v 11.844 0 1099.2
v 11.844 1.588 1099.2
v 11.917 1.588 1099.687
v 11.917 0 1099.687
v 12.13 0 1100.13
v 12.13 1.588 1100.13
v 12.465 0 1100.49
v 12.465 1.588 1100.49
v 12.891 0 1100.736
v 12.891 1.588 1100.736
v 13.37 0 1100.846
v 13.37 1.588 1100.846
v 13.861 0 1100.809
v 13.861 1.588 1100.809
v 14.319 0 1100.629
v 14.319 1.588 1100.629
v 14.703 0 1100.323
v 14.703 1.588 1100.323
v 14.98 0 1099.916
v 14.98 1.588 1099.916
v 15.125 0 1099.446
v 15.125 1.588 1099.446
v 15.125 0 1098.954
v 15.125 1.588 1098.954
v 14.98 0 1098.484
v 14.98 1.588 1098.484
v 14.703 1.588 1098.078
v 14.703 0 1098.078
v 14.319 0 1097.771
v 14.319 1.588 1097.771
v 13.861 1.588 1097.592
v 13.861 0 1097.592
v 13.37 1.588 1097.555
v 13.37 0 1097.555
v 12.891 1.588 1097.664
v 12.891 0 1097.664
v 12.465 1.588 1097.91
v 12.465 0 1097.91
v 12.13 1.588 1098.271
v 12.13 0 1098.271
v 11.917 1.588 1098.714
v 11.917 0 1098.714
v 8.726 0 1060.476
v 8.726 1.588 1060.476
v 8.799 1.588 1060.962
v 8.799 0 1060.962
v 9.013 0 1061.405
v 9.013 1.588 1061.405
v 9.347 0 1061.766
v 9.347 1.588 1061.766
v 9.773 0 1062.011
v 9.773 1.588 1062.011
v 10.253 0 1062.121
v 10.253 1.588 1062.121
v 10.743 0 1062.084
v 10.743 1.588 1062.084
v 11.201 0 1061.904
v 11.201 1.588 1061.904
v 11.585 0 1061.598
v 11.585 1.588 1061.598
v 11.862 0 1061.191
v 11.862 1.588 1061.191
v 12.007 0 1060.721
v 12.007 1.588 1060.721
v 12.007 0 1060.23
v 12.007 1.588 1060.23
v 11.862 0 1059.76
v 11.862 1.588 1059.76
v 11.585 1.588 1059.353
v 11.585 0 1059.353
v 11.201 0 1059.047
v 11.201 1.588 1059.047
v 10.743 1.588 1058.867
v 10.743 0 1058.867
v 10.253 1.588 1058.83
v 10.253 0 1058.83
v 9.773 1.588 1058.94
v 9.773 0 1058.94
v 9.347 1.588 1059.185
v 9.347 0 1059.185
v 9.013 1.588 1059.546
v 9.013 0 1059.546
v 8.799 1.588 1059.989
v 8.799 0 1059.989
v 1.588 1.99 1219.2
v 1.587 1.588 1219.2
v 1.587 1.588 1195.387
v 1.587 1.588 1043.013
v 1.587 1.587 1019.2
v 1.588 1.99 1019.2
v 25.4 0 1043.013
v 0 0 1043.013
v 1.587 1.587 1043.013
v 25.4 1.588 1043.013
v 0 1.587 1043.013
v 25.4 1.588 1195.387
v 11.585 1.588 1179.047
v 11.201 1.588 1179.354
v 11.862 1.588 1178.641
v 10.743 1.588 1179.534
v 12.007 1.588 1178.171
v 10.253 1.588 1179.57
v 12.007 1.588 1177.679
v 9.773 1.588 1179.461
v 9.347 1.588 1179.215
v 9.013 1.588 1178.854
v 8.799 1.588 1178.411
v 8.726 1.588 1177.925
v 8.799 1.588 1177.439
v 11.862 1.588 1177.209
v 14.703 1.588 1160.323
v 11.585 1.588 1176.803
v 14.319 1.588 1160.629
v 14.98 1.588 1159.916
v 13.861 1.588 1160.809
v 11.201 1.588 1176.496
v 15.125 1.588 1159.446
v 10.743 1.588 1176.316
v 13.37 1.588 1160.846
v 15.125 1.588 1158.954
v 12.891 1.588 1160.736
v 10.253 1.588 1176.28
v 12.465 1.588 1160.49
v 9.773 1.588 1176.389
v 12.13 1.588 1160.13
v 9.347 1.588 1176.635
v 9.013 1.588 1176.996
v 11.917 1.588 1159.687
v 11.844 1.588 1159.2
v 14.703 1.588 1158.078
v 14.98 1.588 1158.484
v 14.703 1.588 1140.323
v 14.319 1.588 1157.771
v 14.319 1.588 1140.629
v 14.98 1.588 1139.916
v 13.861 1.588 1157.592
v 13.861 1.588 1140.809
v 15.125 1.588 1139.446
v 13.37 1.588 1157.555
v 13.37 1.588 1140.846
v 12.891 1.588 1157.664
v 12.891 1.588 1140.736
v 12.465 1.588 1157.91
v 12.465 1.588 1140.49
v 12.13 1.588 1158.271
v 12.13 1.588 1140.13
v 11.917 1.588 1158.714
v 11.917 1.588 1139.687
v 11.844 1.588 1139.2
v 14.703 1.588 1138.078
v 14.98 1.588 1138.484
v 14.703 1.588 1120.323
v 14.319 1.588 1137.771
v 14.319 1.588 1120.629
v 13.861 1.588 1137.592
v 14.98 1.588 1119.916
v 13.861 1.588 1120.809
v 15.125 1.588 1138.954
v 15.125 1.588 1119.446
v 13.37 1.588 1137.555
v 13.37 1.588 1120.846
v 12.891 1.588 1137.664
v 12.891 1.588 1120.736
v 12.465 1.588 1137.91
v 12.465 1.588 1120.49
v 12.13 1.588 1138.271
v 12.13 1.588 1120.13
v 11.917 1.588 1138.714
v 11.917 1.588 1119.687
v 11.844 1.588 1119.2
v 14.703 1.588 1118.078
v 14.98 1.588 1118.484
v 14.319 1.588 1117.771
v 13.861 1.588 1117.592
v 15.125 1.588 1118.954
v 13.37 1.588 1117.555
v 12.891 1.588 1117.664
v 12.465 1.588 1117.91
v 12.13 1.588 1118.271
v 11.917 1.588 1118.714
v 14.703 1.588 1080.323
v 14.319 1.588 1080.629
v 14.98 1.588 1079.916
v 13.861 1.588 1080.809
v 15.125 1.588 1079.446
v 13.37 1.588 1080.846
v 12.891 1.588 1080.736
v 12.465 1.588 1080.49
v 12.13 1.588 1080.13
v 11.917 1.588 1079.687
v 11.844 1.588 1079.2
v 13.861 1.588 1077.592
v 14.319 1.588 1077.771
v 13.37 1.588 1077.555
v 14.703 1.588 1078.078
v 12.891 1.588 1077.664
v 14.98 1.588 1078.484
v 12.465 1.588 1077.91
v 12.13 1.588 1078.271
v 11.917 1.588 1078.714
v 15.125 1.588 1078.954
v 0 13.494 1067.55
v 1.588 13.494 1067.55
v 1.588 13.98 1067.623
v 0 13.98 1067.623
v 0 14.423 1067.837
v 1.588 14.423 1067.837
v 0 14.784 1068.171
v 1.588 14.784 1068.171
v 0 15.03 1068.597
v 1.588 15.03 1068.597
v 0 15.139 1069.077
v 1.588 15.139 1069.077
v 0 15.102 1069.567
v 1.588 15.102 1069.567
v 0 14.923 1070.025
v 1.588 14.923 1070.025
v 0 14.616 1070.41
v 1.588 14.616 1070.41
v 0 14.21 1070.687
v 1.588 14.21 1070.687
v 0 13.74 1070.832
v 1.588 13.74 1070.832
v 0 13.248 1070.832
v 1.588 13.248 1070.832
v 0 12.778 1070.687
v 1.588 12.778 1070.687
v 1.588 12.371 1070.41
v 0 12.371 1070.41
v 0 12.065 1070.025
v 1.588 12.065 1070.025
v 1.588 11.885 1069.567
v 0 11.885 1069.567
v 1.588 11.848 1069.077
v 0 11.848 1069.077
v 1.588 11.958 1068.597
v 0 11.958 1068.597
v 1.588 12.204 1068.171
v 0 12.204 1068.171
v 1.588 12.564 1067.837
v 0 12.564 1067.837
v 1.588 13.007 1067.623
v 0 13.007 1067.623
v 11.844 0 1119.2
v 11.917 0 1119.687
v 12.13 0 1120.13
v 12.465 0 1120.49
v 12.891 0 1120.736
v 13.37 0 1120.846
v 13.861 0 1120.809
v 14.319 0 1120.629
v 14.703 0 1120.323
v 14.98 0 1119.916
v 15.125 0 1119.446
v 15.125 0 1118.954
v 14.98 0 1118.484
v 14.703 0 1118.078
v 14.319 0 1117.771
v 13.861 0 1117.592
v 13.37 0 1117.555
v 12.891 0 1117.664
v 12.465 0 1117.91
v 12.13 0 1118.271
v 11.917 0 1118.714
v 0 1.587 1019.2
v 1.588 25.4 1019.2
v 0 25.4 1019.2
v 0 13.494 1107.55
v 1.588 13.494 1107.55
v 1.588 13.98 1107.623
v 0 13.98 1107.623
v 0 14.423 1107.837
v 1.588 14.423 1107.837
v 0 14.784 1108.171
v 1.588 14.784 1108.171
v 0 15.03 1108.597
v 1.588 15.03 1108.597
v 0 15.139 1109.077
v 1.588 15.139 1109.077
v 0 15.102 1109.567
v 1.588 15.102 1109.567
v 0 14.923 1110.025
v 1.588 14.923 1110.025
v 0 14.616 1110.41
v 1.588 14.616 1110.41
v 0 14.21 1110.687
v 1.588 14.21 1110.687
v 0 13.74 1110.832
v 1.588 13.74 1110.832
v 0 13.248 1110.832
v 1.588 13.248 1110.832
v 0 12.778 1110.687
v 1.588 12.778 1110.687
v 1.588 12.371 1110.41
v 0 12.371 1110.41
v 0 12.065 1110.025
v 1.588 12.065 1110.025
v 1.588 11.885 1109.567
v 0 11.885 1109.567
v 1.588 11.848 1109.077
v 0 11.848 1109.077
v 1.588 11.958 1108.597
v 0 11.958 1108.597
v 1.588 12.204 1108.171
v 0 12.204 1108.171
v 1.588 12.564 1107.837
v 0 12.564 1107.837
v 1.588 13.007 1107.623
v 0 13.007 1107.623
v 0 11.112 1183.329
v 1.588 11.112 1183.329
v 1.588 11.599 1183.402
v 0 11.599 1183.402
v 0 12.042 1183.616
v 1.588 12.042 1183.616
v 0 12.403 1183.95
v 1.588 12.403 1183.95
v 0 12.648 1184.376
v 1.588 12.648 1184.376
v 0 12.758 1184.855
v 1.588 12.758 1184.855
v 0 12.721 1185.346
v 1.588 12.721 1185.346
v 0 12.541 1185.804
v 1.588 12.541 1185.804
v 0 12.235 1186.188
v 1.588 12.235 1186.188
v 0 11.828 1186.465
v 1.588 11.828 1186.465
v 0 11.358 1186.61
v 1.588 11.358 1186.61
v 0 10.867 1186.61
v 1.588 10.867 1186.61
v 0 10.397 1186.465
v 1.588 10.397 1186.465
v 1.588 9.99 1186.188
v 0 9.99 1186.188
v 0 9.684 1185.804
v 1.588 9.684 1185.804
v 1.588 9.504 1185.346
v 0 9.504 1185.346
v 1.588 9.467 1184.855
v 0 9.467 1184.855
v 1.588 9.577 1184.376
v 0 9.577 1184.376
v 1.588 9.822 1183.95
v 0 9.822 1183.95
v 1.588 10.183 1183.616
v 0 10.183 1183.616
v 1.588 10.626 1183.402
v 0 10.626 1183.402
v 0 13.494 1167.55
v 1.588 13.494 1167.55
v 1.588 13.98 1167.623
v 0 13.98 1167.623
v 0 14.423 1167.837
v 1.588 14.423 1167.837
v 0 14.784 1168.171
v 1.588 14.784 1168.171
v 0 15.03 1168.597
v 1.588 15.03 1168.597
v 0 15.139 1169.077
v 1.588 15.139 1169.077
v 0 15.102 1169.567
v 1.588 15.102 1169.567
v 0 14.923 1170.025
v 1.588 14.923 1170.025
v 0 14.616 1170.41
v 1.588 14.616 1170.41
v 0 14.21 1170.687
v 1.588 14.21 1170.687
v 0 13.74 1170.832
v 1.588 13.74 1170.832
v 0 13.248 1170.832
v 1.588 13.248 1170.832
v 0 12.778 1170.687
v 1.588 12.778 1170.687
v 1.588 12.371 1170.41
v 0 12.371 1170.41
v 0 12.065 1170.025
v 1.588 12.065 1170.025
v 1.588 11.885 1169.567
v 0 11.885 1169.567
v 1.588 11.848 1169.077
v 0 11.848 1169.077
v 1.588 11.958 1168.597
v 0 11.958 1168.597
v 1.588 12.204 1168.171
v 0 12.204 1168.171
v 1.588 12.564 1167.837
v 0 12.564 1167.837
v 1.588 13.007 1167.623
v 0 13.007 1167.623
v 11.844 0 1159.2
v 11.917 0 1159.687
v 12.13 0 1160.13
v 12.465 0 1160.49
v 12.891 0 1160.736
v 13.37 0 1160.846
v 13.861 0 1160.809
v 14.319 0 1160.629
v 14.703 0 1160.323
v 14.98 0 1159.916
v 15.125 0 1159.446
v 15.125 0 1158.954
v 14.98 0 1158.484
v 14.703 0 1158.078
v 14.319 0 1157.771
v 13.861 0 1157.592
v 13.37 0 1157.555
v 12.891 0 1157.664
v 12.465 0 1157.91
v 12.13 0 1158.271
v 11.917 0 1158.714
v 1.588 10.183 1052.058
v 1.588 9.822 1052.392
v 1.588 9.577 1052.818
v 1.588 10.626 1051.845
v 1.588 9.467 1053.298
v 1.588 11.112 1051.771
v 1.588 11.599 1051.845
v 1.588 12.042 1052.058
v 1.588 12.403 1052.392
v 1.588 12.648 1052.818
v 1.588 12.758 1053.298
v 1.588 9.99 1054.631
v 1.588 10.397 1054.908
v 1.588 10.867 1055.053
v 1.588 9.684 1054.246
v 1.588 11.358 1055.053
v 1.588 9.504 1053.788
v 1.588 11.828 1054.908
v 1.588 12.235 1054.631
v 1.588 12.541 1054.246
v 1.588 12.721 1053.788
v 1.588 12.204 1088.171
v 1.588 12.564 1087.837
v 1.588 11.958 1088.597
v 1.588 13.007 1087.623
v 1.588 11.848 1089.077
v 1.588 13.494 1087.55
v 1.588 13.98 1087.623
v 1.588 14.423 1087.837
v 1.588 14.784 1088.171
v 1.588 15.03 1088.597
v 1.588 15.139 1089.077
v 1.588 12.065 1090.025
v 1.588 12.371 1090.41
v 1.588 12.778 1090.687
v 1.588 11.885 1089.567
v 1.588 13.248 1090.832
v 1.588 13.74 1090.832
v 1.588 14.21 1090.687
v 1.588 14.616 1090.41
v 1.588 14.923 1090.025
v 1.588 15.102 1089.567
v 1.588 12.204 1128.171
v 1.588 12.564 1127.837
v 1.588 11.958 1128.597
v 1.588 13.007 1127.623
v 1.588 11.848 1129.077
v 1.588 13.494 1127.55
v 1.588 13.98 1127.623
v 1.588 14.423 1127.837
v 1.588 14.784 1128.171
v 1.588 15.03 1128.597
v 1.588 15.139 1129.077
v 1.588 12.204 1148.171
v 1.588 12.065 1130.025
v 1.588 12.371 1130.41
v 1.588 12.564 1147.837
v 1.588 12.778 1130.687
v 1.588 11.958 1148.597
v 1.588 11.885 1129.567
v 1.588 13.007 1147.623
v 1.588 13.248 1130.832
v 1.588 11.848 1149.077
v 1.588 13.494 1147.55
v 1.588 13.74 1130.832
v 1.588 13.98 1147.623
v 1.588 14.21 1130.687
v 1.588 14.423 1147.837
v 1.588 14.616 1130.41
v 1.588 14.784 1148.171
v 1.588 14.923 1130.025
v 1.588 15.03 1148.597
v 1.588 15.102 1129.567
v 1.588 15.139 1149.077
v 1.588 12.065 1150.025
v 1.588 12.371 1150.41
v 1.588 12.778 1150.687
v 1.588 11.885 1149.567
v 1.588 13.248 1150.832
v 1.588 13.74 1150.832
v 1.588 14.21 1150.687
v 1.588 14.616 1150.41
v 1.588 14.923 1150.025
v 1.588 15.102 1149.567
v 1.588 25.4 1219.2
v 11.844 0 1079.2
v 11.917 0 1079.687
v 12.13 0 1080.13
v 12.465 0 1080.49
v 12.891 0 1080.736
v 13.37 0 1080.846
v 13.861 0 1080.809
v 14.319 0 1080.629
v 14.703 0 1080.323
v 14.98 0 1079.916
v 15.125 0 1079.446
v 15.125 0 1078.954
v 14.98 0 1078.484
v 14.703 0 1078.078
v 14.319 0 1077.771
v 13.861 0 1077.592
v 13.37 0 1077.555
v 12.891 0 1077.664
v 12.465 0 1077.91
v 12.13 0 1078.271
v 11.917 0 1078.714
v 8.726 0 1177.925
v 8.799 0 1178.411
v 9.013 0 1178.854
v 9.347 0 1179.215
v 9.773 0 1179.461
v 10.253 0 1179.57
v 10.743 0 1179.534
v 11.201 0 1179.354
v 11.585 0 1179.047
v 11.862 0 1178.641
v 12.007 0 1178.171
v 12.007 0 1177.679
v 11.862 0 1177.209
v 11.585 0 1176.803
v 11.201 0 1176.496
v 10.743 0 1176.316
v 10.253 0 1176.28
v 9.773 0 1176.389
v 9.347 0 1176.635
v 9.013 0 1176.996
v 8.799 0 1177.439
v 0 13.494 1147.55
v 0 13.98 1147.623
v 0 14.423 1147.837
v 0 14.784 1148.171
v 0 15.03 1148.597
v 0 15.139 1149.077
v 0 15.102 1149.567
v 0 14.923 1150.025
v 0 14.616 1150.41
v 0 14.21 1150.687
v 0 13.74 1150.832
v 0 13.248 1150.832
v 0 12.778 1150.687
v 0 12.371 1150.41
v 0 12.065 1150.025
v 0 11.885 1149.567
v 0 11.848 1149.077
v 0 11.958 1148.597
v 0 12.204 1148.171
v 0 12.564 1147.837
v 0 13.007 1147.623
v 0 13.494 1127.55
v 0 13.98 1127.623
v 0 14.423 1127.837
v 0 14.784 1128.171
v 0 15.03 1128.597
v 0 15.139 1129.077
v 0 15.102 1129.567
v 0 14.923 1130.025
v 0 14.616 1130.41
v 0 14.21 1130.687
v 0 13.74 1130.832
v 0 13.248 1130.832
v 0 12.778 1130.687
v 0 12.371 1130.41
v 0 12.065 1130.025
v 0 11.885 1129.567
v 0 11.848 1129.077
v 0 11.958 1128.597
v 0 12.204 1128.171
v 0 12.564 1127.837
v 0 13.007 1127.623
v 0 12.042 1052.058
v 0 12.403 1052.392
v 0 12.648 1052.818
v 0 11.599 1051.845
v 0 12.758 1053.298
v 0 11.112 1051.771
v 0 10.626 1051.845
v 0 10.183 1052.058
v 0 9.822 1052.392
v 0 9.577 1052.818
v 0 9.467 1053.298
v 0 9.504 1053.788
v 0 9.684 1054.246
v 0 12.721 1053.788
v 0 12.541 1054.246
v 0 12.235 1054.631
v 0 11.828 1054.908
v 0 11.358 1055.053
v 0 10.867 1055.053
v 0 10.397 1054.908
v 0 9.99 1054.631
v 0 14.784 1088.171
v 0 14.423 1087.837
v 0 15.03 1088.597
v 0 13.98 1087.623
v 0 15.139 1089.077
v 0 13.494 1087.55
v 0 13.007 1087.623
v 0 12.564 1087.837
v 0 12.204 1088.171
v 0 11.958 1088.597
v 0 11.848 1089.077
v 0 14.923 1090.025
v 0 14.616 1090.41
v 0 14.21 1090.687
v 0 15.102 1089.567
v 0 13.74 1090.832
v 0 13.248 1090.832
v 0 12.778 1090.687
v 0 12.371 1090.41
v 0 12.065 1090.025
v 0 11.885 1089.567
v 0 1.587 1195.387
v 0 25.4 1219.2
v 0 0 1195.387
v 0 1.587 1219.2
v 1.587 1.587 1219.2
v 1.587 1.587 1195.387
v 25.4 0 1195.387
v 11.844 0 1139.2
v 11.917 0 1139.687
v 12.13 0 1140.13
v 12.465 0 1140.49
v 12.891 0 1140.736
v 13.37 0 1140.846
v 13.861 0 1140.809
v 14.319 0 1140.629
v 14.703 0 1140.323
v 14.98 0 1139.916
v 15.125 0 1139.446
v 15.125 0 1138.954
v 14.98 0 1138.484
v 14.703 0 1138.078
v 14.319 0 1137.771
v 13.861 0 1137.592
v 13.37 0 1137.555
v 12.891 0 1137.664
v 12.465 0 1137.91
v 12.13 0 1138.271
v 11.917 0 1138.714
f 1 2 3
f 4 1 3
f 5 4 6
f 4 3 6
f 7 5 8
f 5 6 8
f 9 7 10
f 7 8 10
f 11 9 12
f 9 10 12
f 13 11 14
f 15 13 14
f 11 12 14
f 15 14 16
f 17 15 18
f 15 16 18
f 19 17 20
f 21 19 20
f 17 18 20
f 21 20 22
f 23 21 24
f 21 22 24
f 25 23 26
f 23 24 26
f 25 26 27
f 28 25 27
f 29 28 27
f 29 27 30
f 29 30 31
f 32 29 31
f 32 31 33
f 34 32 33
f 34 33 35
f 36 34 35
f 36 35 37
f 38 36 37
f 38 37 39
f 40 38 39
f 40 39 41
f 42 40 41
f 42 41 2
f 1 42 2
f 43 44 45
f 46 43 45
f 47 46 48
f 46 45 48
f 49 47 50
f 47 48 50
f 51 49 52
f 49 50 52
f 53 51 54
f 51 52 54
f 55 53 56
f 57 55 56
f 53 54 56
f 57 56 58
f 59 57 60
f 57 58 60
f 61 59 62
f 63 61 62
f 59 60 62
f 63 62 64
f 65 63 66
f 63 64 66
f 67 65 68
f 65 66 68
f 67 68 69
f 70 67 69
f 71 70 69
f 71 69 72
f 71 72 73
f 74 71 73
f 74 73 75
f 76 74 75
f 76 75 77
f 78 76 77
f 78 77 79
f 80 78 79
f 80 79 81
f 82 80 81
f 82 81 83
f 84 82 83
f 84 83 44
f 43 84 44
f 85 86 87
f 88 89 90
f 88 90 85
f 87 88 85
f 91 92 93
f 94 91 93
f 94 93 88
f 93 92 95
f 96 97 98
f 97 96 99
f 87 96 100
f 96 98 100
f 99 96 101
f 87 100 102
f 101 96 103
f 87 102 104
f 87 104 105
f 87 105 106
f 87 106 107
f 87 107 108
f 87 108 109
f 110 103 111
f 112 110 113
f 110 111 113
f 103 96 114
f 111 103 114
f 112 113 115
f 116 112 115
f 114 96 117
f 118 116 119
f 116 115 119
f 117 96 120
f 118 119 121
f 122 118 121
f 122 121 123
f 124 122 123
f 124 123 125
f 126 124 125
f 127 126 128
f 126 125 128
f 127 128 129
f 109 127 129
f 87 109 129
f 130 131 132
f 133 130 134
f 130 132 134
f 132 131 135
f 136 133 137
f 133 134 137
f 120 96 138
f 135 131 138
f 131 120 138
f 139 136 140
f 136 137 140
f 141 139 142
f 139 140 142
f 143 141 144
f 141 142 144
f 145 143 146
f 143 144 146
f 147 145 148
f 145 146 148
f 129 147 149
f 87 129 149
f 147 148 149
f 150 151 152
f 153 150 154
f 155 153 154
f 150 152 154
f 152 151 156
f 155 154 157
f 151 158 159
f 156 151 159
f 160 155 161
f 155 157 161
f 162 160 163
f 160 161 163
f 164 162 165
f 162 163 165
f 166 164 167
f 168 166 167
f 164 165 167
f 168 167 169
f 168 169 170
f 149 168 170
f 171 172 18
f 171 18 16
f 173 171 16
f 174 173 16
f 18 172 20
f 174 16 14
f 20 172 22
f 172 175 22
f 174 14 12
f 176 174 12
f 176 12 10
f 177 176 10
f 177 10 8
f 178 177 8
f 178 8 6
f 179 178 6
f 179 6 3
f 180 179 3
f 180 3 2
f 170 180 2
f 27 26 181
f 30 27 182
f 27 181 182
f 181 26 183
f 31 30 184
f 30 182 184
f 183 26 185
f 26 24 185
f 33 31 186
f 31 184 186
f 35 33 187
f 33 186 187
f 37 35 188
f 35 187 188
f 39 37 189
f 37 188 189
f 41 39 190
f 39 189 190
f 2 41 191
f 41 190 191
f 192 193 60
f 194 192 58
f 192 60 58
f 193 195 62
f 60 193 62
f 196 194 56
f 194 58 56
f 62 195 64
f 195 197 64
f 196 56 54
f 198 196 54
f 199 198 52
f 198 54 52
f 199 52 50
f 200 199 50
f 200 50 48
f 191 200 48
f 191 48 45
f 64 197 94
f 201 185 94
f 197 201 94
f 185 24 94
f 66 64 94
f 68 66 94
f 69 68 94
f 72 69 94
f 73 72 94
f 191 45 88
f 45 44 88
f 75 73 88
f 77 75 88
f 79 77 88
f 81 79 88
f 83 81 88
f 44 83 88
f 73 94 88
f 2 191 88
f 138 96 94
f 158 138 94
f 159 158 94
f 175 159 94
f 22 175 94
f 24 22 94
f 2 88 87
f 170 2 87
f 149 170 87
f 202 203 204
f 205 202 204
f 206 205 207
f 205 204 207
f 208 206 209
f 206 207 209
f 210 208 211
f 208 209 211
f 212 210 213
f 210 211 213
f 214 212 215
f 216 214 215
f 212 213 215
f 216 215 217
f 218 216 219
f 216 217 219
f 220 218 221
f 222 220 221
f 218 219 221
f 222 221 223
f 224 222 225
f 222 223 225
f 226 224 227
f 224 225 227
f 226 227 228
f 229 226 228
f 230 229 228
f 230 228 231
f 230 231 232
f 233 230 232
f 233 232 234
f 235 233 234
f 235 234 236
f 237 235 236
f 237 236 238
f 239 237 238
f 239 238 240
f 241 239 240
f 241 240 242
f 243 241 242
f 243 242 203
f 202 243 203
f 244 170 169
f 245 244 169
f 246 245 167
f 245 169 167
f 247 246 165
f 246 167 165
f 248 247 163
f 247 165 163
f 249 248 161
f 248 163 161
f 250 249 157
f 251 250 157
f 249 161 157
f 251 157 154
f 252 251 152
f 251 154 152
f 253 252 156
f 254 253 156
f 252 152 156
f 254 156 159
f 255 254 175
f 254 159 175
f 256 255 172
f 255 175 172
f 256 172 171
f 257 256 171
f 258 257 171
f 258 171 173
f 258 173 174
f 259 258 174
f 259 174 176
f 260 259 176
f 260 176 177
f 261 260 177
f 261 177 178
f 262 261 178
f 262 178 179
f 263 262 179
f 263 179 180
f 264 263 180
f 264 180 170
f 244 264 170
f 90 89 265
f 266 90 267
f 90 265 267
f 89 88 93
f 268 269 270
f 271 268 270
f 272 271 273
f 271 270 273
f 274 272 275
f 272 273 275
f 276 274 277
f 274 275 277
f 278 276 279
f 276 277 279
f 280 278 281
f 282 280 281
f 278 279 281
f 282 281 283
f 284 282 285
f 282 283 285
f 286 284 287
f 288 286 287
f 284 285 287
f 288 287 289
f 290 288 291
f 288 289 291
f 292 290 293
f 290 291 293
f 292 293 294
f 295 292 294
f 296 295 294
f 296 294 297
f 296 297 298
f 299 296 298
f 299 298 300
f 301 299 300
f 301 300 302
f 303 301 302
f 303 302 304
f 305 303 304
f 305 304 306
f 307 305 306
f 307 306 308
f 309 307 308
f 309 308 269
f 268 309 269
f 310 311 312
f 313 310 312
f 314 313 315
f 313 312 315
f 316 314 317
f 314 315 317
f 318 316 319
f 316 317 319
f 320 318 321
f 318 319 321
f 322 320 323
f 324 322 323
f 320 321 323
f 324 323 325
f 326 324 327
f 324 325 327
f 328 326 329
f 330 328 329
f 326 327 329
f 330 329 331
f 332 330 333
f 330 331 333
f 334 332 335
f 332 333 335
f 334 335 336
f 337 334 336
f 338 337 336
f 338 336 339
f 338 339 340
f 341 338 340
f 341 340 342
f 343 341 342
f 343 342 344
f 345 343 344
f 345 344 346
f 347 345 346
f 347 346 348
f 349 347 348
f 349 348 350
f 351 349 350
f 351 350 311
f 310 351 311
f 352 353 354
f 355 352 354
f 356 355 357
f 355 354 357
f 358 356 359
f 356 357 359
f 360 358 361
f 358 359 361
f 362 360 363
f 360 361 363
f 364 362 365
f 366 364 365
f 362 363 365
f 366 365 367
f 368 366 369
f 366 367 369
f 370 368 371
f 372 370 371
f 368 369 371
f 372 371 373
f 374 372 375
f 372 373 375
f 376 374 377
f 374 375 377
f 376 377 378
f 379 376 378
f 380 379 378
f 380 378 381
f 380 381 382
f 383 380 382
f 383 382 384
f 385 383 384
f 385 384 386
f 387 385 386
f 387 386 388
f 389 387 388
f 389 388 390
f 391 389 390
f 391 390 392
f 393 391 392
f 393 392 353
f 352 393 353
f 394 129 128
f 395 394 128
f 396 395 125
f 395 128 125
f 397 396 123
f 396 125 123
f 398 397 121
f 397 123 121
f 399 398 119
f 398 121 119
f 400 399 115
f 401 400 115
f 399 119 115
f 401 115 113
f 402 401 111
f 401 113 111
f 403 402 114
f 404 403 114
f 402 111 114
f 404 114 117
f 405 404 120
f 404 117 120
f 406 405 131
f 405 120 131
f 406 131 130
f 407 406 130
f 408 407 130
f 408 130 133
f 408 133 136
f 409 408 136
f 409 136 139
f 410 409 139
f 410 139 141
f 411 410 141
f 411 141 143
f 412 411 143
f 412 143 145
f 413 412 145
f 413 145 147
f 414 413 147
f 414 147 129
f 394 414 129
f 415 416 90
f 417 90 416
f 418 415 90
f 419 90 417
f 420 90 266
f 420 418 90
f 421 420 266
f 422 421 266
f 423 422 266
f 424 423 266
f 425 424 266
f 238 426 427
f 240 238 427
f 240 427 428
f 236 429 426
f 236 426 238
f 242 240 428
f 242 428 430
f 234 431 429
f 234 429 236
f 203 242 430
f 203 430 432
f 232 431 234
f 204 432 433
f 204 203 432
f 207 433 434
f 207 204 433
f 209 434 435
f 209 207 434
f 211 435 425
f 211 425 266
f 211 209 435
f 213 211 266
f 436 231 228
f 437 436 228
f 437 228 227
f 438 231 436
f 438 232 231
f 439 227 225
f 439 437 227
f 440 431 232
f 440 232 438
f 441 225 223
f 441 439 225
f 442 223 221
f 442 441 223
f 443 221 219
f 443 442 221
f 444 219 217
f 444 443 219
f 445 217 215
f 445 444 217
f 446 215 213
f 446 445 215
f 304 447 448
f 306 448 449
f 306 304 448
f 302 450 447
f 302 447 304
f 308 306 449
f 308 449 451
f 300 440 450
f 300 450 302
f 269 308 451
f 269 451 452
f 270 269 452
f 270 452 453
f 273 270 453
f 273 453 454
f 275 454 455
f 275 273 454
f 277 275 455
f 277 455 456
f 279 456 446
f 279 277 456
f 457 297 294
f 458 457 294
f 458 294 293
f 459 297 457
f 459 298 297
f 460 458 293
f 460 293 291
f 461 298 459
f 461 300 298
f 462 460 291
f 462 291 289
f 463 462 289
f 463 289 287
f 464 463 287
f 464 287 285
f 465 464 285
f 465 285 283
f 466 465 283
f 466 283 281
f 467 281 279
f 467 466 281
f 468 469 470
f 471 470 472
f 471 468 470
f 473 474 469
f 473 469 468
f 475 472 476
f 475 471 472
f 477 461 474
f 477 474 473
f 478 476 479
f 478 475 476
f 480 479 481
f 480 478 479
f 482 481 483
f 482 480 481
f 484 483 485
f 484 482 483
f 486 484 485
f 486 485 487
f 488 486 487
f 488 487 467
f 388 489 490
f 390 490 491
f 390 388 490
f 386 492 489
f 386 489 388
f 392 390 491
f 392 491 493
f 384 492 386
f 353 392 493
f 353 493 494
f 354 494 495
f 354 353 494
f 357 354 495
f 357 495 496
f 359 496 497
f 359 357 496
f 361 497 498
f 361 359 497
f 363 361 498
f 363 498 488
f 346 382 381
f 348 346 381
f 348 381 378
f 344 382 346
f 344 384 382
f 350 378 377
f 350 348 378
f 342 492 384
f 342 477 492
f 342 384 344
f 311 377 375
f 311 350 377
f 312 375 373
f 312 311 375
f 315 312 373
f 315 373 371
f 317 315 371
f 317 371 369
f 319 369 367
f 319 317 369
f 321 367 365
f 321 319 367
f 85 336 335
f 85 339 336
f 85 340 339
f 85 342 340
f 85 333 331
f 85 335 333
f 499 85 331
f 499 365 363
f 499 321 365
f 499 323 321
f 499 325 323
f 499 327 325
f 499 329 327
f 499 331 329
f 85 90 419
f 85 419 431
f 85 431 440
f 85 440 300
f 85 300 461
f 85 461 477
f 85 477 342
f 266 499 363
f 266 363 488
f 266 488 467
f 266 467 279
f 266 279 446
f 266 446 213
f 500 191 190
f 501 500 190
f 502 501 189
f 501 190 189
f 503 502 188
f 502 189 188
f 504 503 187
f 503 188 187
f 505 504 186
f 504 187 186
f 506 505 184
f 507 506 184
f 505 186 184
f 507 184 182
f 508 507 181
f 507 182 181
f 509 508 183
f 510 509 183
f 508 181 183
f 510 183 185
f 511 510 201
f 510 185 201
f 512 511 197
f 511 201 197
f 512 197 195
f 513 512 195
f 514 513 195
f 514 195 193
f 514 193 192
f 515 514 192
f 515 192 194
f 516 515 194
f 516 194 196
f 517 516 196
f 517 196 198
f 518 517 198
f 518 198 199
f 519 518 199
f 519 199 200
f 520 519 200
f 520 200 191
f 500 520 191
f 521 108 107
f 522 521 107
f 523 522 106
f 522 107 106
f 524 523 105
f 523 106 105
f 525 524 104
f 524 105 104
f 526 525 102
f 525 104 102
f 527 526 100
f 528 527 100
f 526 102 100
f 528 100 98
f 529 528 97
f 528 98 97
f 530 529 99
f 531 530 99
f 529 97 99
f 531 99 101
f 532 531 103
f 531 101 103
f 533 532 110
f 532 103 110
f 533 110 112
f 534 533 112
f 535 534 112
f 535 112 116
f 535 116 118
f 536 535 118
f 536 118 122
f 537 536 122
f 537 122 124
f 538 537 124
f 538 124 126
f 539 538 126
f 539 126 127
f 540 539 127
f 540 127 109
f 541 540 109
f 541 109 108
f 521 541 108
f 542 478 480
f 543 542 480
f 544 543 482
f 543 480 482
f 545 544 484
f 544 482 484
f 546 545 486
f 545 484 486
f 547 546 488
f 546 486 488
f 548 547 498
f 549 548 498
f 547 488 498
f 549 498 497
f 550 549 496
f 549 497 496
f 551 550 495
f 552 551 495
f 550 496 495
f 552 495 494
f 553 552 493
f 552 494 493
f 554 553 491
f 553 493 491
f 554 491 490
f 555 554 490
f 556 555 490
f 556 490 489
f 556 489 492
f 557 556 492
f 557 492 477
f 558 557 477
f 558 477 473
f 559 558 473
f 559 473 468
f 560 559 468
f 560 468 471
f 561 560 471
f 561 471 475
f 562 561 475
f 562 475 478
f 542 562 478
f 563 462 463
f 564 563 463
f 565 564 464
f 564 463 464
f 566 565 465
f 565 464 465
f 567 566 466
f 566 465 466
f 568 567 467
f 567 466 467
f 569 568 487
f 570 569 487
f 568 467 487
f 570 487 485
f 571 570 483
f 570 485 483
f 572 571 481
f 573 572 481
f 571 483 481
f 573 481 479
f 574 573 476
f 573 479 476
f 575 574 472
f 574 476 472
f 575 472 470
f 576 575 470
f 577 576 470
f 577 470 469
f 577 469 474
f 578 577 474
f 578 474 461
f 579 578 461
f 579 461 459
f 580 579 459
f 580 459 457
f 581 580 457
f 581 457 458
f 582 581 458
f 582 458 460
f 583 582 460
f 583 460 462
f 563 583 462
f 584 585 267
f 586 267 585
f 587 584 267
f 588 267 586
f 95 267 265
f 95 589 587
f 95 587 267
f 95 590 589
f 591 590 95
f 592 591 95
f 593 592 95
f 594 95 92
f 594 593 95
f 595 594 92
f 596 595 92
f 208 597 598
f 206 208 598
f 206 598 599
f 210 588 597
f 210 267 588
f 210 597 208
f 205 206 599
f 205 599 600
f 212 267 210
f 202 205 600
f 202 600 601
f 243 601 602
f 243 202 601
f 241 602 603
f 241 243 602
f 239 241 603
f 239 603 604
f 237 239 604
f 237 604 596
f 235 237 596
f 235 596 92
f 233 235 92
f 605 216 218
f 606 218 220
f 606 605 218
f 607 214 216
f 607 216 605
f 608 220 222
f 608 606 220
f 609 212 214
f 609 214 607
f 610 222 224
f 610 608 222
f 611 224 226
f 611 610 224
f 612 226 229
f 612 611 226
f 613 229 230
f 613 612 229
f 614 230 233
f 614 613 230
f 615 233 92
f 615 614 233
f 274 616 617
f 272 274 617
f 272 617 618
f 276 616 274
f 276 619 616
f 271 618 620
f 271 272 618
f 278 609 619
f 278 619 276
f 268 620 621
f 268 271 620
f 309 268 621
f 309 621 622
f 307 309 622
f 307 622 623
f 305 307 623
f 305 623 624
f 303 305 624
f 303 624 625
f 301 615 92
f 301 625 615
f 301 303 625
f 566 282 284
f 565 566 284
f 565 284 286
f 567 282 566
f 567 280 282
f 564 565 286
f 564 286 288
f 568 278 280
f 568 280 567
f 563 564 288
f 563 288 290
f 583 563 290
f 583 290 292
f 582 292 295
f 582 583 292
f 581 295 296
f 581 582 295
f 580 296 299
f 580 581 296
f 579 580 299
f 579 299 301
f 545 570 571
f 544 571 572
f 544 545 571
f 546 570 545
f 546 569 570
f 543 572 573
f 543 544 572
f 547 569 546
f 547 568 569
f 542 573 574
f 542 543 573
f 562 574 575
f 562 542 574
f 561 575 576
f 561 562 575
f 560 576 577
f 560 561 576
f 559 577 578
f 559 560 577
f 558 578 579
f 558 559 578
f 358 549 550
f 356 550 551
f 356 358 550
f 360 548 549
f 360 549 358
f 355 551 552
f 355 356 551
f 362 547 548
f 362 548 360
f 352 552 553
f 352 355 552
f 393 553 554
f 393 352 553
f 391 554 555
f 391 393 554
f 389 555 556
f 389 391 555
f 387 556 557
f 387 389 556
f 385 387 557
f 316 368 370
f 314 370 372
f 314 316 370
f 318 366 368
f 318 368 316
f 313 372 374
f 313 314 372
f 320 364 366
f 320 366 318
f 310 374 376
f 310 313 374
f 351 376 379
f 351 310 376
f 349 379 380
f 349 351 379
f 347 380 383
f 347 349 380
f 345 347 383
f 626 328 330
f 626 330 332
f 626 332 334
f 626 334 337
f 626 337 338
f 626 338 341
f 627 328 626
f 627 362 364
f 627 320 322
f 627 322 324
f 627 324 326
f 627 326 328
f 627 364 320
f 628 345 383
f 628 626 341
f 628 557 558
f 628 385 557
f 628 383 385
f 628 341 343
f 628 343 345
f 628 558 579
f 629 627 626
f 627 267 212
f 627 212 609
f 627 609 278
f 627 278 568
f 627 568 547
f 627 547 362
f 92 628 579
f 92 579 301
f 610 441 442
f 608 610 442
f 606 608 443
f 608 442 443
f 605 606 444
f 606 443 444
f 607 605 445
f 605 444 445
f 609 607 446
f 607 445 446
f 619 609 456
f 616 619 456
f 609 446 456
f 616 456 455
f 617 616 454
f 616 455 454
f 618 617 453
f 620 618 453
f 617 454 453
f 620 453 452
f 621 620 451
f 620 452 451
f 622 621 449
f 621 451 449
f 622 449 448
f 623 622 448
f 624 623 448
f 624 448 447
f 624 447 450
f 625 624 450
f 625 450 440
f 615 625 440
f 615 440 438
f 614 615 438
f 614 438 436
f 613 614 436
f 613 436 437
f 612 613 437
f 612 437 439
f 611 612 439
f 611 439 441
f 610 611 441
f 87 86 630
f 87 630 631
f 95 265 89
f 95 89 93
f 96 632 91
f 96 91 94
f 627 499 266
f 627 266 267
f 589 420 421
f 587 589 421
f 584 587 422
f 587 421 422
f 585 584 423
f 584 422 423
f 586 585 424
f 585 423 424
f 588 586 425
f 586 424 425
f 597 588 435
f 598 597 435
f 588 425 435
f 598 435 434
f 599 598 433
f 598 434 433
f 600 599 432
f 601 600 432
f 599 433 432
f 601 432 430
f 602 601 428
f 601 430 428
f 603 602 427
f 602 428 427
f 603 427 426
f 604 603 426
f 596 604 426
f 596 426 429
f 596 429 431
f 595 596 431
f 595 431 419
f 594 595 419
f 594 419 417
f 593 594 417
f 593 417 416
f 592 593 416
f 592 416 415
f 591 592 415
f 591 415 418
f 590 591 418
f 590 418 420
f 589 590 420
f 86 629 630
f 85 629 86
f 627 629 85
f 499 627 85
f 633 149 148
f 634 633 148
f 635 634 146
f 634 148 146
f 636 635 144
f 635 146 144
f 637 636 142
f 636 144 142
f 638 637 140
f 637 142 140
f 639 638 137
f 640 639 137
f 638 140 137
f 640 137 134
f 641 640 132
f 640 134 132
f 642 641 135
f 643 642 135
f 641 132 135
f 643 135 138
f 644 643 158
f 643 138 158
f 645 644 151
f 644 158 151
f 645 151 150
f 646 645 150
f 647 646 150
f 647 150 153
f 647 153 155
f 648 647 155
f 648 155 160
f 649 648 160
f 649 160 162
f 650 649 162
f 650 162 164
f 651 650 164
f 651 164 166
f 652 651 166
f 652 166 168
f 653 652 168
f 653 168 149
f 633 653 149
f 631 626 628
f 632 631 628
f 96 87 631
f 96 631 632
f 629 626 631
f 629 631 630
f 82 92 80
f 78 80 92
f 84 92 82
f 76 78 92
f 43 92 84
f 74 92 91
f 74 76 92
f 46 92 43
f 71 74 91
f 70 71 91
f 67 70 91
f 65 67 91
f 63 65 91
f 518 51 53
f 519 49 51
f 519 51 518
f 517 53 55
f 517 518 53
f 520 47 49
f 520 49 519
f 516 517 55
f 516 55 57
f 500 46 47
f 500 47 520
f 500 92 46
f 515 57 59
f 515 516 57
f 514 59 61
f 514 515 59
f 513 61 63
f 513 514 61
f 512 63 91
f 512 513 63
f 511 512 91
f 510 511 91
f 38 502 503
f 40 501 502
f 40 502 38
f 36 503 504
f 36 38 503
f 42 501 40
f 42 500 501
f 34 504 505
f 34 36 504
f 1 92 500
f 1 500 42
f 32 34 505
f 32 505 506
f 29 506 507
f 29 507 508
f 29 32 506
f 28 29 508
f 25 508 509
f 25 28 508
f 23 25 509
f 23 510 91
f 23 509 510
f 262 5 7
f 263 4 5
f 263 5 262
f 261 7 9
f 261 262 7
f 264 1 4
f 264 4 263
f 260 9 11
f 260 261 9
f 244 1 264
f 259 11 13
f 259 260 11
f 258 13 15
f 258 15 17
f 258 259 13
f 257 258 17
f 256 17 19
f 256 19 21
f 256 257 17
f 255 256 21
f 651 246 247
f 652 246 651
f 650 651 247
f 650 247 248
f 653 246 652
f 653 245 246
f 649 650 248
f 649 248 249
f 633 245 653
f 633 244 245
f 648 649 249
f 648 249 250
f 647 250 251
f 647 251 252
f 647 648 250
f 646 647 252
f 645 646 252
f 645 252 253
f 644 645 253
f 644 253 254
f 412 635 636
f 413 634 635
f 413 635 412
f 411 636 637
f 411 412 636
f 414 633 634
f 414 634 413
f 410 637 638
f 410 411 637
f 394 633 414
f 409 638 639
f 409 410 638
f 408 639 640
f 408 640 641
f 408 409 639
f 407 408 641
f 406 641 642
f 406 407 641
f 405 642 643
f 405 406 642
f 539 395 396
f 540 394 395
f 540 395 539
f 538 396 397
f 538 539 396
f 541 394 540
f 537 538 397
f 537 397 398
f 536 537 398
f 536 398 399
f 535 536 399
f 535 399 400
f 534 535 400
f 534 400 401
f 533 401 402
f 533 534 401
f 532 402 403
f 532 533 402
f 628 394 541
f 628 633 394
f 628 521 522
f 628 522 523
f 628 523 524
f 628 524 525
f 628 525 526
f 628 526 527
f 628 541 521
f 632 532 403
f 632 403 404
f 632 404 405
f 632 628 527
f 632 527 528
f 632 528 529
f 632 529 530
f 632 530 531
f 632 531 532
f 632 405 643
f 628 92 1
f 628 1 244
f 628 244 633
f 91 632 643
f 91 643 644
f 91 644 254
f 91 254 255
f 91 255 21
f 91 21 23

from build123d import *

# Parameters (mm, degrees)
BOSS_EXTRUDE1_DEPTH = 1219.2
FILLET1_R           = 0.254
SKETCH4_W           = 2238.4
SKETCH4_H           = 74.945320812
CUT_EXTRUDE1_DEPTH  = 60
SKETCH8_W           = 23.813
SKETCH8_H           = 23.813
CUT_EXTRUDE6_DEPTH  = 28.313
CUT_EXTRUDE7_DEPTH  = 228.313
SKETCH10_W          = 23.813
SKETCH10_H          = 1.587
CUT_EXTRUDE8_DEPTH  = 228.313
SKETCH14_R          = 1.65
CUT_EXTRUDE11_DEPTH = 60
SKETCH15_R          = 1.65
CUT_EXTRUDE12_DEPTH = 60


with BuildPart() as part:
    # Sketch3 → Boss-Extrude1 (new, symmetric)
    with BuildSketch(Plane.XY):
        Polygon((1.5875, 25.4), (0, 25.4), (0, 0), (25.4, 0), (25.4, 1.5875), (1.5875, 1.5875), align=None)
    extrude(amount=BOSS_EXTRUDE1_DEPTH, both=True)

    # Fillet1
    fillet1_edges = [part.edges().sort_by_distance(p)[0] for p in [
        (1.5875, 1.5875, 0),
    ]]
    fillet(fillet1_edges, radius=FILLET1_R)

    # Sketch4 → Cut-Extrude1 (cut)
    with BuildSketch(Plane.ZY):
        with Locations((-100, 37.472660406)):
            Rectangle(SKETCH4_W, SKETCH4_H)
    extrude(amount=-CUT_EXTRUDE1_DEPTH, mode=Mode.SUBTRACT)

    # Sketch8 → Cut-Extrude6 (cut)
    with BuildSketch(Plane(origin=(0, 1.5875, 0), x_dir=(1, 0, 0), z_dir=(0, 1, 0))):
        with Locations((13.4935, -1207.2935)):
            Rectangle(SKETCH8_W, SKETCH8_H)
        with Locations((13.4935, -1031.1065)):
            Rectangle(SKETCH8_W, SKETCH8_H)
    extrude(amount=-CUT_EXTRUDE6_DEPTH, mode=Mode.SUBTRACT)

    # Sketch9 → Cut-Extrude7 (cut)
    with BuildSketch(Plane(origin=(0, 0, 1019.2), x_dir=(-1, 0, 0), z_dir=(0, 0, -1))):
        Polygon((-1.8415, 1.5875), (-1.587, 1.5875), (-1.5875, 1.990327362), (-1.8415, 1.990327362), align=None)
    extrude(amount=-CUT_EXTRUDE7_DEPTH, mode=Mode.SUBTRACT)

    # Sketch10 → Cut-Extrude8 (cut)
    with BuildSketch(Plane.ZY):
        with Locations((1207.2935, 0.7935)):
            Rectangle(SKETCH10_W, SKETCH10_H)
        with Locations((1031.1065, 0.7935)):
            Rectangle(SKETCH10_W, SKETCH10_H)
    extrude(amount=-CUT_EXTRUDE8_DEPTH, mode=Mode.SUBTRACT)

    # Sketch14 → Cut-Extrude11 (cut)
    with BuildSketch(Plane(origin=(0, 1.5875, 0), x_dir=(1, 0, 0), z_dir=(0, 1, 0))):
        with Locations(Location((10.3759, -1177.925, 0), (0, 0, 180))):
            Circle(SKETCH14_R)
        with Locations(Location((10.3759, -1060.4755, 0), (0, 0, 180))):
            Circle(SKETCH14_R)
        with Locations(Location((13.49375, -1079.20025, 0), (0, 0, 180))):
            Circle(SKETCH14_R)
        with Locations(Location((13.49375, -1099.20025, 0), (0, 0, 180))):
            Circle(SKETCH14_R)
        with Locations(Location((13.49375, -1119.20025, 0), (0, 0, 180))):
            Circle(SKETCH14_R)
        with Locations(Location((13.49375, -1139.20025, 0), (0, 0, 180))):
            Circle(SKETCH14_R)
        with Locations(Location((13.49375, -1159.20025, 0), (0, 0, 180))):
            Circle(SKETCH14_R)
    extrude(amount=-CUT_EXTRUDE11_DEPTH, mode=Mode.SUBTRACT)

    # Sketch15 → Cut-Extrude12 (cut)
    with BuildSketch(Plane(origin=(1.5875, 0, 0), x_dir=(0, 0, -1), z_dir=(1, 0, 0))):
        with Locations((-1184.978795667, 11.1125)):
            Circle(SKETCH15_R)
        with Locations((-1053.421204333, 11.1125)):
            Circle(SKETCH15_R)
        with Locations((-1069.2, 13.49375)):
            Circle(SKETCH15_R)
        with Locations((-1089.2, 13.49375)):
            Circle(SKETCH15_R)
        with Locations((-1109.2, 13.49375)):
            Circle(SKETCH15_R)
        with Locations((-1129.2, 13.49375)):
            Circle(SKETCH15_R)
        with Locations((-1149.2, 13.49375)):
            Circle(SKETCH15_R)
        with Locations((-1169.2, 13.49375)):
            Circle(SKETCH15_R)
    extrude(amount=-CUT_EXTRUDE12_DEPTH, mode=Mode.SUBTRACT)


solid = part.part
